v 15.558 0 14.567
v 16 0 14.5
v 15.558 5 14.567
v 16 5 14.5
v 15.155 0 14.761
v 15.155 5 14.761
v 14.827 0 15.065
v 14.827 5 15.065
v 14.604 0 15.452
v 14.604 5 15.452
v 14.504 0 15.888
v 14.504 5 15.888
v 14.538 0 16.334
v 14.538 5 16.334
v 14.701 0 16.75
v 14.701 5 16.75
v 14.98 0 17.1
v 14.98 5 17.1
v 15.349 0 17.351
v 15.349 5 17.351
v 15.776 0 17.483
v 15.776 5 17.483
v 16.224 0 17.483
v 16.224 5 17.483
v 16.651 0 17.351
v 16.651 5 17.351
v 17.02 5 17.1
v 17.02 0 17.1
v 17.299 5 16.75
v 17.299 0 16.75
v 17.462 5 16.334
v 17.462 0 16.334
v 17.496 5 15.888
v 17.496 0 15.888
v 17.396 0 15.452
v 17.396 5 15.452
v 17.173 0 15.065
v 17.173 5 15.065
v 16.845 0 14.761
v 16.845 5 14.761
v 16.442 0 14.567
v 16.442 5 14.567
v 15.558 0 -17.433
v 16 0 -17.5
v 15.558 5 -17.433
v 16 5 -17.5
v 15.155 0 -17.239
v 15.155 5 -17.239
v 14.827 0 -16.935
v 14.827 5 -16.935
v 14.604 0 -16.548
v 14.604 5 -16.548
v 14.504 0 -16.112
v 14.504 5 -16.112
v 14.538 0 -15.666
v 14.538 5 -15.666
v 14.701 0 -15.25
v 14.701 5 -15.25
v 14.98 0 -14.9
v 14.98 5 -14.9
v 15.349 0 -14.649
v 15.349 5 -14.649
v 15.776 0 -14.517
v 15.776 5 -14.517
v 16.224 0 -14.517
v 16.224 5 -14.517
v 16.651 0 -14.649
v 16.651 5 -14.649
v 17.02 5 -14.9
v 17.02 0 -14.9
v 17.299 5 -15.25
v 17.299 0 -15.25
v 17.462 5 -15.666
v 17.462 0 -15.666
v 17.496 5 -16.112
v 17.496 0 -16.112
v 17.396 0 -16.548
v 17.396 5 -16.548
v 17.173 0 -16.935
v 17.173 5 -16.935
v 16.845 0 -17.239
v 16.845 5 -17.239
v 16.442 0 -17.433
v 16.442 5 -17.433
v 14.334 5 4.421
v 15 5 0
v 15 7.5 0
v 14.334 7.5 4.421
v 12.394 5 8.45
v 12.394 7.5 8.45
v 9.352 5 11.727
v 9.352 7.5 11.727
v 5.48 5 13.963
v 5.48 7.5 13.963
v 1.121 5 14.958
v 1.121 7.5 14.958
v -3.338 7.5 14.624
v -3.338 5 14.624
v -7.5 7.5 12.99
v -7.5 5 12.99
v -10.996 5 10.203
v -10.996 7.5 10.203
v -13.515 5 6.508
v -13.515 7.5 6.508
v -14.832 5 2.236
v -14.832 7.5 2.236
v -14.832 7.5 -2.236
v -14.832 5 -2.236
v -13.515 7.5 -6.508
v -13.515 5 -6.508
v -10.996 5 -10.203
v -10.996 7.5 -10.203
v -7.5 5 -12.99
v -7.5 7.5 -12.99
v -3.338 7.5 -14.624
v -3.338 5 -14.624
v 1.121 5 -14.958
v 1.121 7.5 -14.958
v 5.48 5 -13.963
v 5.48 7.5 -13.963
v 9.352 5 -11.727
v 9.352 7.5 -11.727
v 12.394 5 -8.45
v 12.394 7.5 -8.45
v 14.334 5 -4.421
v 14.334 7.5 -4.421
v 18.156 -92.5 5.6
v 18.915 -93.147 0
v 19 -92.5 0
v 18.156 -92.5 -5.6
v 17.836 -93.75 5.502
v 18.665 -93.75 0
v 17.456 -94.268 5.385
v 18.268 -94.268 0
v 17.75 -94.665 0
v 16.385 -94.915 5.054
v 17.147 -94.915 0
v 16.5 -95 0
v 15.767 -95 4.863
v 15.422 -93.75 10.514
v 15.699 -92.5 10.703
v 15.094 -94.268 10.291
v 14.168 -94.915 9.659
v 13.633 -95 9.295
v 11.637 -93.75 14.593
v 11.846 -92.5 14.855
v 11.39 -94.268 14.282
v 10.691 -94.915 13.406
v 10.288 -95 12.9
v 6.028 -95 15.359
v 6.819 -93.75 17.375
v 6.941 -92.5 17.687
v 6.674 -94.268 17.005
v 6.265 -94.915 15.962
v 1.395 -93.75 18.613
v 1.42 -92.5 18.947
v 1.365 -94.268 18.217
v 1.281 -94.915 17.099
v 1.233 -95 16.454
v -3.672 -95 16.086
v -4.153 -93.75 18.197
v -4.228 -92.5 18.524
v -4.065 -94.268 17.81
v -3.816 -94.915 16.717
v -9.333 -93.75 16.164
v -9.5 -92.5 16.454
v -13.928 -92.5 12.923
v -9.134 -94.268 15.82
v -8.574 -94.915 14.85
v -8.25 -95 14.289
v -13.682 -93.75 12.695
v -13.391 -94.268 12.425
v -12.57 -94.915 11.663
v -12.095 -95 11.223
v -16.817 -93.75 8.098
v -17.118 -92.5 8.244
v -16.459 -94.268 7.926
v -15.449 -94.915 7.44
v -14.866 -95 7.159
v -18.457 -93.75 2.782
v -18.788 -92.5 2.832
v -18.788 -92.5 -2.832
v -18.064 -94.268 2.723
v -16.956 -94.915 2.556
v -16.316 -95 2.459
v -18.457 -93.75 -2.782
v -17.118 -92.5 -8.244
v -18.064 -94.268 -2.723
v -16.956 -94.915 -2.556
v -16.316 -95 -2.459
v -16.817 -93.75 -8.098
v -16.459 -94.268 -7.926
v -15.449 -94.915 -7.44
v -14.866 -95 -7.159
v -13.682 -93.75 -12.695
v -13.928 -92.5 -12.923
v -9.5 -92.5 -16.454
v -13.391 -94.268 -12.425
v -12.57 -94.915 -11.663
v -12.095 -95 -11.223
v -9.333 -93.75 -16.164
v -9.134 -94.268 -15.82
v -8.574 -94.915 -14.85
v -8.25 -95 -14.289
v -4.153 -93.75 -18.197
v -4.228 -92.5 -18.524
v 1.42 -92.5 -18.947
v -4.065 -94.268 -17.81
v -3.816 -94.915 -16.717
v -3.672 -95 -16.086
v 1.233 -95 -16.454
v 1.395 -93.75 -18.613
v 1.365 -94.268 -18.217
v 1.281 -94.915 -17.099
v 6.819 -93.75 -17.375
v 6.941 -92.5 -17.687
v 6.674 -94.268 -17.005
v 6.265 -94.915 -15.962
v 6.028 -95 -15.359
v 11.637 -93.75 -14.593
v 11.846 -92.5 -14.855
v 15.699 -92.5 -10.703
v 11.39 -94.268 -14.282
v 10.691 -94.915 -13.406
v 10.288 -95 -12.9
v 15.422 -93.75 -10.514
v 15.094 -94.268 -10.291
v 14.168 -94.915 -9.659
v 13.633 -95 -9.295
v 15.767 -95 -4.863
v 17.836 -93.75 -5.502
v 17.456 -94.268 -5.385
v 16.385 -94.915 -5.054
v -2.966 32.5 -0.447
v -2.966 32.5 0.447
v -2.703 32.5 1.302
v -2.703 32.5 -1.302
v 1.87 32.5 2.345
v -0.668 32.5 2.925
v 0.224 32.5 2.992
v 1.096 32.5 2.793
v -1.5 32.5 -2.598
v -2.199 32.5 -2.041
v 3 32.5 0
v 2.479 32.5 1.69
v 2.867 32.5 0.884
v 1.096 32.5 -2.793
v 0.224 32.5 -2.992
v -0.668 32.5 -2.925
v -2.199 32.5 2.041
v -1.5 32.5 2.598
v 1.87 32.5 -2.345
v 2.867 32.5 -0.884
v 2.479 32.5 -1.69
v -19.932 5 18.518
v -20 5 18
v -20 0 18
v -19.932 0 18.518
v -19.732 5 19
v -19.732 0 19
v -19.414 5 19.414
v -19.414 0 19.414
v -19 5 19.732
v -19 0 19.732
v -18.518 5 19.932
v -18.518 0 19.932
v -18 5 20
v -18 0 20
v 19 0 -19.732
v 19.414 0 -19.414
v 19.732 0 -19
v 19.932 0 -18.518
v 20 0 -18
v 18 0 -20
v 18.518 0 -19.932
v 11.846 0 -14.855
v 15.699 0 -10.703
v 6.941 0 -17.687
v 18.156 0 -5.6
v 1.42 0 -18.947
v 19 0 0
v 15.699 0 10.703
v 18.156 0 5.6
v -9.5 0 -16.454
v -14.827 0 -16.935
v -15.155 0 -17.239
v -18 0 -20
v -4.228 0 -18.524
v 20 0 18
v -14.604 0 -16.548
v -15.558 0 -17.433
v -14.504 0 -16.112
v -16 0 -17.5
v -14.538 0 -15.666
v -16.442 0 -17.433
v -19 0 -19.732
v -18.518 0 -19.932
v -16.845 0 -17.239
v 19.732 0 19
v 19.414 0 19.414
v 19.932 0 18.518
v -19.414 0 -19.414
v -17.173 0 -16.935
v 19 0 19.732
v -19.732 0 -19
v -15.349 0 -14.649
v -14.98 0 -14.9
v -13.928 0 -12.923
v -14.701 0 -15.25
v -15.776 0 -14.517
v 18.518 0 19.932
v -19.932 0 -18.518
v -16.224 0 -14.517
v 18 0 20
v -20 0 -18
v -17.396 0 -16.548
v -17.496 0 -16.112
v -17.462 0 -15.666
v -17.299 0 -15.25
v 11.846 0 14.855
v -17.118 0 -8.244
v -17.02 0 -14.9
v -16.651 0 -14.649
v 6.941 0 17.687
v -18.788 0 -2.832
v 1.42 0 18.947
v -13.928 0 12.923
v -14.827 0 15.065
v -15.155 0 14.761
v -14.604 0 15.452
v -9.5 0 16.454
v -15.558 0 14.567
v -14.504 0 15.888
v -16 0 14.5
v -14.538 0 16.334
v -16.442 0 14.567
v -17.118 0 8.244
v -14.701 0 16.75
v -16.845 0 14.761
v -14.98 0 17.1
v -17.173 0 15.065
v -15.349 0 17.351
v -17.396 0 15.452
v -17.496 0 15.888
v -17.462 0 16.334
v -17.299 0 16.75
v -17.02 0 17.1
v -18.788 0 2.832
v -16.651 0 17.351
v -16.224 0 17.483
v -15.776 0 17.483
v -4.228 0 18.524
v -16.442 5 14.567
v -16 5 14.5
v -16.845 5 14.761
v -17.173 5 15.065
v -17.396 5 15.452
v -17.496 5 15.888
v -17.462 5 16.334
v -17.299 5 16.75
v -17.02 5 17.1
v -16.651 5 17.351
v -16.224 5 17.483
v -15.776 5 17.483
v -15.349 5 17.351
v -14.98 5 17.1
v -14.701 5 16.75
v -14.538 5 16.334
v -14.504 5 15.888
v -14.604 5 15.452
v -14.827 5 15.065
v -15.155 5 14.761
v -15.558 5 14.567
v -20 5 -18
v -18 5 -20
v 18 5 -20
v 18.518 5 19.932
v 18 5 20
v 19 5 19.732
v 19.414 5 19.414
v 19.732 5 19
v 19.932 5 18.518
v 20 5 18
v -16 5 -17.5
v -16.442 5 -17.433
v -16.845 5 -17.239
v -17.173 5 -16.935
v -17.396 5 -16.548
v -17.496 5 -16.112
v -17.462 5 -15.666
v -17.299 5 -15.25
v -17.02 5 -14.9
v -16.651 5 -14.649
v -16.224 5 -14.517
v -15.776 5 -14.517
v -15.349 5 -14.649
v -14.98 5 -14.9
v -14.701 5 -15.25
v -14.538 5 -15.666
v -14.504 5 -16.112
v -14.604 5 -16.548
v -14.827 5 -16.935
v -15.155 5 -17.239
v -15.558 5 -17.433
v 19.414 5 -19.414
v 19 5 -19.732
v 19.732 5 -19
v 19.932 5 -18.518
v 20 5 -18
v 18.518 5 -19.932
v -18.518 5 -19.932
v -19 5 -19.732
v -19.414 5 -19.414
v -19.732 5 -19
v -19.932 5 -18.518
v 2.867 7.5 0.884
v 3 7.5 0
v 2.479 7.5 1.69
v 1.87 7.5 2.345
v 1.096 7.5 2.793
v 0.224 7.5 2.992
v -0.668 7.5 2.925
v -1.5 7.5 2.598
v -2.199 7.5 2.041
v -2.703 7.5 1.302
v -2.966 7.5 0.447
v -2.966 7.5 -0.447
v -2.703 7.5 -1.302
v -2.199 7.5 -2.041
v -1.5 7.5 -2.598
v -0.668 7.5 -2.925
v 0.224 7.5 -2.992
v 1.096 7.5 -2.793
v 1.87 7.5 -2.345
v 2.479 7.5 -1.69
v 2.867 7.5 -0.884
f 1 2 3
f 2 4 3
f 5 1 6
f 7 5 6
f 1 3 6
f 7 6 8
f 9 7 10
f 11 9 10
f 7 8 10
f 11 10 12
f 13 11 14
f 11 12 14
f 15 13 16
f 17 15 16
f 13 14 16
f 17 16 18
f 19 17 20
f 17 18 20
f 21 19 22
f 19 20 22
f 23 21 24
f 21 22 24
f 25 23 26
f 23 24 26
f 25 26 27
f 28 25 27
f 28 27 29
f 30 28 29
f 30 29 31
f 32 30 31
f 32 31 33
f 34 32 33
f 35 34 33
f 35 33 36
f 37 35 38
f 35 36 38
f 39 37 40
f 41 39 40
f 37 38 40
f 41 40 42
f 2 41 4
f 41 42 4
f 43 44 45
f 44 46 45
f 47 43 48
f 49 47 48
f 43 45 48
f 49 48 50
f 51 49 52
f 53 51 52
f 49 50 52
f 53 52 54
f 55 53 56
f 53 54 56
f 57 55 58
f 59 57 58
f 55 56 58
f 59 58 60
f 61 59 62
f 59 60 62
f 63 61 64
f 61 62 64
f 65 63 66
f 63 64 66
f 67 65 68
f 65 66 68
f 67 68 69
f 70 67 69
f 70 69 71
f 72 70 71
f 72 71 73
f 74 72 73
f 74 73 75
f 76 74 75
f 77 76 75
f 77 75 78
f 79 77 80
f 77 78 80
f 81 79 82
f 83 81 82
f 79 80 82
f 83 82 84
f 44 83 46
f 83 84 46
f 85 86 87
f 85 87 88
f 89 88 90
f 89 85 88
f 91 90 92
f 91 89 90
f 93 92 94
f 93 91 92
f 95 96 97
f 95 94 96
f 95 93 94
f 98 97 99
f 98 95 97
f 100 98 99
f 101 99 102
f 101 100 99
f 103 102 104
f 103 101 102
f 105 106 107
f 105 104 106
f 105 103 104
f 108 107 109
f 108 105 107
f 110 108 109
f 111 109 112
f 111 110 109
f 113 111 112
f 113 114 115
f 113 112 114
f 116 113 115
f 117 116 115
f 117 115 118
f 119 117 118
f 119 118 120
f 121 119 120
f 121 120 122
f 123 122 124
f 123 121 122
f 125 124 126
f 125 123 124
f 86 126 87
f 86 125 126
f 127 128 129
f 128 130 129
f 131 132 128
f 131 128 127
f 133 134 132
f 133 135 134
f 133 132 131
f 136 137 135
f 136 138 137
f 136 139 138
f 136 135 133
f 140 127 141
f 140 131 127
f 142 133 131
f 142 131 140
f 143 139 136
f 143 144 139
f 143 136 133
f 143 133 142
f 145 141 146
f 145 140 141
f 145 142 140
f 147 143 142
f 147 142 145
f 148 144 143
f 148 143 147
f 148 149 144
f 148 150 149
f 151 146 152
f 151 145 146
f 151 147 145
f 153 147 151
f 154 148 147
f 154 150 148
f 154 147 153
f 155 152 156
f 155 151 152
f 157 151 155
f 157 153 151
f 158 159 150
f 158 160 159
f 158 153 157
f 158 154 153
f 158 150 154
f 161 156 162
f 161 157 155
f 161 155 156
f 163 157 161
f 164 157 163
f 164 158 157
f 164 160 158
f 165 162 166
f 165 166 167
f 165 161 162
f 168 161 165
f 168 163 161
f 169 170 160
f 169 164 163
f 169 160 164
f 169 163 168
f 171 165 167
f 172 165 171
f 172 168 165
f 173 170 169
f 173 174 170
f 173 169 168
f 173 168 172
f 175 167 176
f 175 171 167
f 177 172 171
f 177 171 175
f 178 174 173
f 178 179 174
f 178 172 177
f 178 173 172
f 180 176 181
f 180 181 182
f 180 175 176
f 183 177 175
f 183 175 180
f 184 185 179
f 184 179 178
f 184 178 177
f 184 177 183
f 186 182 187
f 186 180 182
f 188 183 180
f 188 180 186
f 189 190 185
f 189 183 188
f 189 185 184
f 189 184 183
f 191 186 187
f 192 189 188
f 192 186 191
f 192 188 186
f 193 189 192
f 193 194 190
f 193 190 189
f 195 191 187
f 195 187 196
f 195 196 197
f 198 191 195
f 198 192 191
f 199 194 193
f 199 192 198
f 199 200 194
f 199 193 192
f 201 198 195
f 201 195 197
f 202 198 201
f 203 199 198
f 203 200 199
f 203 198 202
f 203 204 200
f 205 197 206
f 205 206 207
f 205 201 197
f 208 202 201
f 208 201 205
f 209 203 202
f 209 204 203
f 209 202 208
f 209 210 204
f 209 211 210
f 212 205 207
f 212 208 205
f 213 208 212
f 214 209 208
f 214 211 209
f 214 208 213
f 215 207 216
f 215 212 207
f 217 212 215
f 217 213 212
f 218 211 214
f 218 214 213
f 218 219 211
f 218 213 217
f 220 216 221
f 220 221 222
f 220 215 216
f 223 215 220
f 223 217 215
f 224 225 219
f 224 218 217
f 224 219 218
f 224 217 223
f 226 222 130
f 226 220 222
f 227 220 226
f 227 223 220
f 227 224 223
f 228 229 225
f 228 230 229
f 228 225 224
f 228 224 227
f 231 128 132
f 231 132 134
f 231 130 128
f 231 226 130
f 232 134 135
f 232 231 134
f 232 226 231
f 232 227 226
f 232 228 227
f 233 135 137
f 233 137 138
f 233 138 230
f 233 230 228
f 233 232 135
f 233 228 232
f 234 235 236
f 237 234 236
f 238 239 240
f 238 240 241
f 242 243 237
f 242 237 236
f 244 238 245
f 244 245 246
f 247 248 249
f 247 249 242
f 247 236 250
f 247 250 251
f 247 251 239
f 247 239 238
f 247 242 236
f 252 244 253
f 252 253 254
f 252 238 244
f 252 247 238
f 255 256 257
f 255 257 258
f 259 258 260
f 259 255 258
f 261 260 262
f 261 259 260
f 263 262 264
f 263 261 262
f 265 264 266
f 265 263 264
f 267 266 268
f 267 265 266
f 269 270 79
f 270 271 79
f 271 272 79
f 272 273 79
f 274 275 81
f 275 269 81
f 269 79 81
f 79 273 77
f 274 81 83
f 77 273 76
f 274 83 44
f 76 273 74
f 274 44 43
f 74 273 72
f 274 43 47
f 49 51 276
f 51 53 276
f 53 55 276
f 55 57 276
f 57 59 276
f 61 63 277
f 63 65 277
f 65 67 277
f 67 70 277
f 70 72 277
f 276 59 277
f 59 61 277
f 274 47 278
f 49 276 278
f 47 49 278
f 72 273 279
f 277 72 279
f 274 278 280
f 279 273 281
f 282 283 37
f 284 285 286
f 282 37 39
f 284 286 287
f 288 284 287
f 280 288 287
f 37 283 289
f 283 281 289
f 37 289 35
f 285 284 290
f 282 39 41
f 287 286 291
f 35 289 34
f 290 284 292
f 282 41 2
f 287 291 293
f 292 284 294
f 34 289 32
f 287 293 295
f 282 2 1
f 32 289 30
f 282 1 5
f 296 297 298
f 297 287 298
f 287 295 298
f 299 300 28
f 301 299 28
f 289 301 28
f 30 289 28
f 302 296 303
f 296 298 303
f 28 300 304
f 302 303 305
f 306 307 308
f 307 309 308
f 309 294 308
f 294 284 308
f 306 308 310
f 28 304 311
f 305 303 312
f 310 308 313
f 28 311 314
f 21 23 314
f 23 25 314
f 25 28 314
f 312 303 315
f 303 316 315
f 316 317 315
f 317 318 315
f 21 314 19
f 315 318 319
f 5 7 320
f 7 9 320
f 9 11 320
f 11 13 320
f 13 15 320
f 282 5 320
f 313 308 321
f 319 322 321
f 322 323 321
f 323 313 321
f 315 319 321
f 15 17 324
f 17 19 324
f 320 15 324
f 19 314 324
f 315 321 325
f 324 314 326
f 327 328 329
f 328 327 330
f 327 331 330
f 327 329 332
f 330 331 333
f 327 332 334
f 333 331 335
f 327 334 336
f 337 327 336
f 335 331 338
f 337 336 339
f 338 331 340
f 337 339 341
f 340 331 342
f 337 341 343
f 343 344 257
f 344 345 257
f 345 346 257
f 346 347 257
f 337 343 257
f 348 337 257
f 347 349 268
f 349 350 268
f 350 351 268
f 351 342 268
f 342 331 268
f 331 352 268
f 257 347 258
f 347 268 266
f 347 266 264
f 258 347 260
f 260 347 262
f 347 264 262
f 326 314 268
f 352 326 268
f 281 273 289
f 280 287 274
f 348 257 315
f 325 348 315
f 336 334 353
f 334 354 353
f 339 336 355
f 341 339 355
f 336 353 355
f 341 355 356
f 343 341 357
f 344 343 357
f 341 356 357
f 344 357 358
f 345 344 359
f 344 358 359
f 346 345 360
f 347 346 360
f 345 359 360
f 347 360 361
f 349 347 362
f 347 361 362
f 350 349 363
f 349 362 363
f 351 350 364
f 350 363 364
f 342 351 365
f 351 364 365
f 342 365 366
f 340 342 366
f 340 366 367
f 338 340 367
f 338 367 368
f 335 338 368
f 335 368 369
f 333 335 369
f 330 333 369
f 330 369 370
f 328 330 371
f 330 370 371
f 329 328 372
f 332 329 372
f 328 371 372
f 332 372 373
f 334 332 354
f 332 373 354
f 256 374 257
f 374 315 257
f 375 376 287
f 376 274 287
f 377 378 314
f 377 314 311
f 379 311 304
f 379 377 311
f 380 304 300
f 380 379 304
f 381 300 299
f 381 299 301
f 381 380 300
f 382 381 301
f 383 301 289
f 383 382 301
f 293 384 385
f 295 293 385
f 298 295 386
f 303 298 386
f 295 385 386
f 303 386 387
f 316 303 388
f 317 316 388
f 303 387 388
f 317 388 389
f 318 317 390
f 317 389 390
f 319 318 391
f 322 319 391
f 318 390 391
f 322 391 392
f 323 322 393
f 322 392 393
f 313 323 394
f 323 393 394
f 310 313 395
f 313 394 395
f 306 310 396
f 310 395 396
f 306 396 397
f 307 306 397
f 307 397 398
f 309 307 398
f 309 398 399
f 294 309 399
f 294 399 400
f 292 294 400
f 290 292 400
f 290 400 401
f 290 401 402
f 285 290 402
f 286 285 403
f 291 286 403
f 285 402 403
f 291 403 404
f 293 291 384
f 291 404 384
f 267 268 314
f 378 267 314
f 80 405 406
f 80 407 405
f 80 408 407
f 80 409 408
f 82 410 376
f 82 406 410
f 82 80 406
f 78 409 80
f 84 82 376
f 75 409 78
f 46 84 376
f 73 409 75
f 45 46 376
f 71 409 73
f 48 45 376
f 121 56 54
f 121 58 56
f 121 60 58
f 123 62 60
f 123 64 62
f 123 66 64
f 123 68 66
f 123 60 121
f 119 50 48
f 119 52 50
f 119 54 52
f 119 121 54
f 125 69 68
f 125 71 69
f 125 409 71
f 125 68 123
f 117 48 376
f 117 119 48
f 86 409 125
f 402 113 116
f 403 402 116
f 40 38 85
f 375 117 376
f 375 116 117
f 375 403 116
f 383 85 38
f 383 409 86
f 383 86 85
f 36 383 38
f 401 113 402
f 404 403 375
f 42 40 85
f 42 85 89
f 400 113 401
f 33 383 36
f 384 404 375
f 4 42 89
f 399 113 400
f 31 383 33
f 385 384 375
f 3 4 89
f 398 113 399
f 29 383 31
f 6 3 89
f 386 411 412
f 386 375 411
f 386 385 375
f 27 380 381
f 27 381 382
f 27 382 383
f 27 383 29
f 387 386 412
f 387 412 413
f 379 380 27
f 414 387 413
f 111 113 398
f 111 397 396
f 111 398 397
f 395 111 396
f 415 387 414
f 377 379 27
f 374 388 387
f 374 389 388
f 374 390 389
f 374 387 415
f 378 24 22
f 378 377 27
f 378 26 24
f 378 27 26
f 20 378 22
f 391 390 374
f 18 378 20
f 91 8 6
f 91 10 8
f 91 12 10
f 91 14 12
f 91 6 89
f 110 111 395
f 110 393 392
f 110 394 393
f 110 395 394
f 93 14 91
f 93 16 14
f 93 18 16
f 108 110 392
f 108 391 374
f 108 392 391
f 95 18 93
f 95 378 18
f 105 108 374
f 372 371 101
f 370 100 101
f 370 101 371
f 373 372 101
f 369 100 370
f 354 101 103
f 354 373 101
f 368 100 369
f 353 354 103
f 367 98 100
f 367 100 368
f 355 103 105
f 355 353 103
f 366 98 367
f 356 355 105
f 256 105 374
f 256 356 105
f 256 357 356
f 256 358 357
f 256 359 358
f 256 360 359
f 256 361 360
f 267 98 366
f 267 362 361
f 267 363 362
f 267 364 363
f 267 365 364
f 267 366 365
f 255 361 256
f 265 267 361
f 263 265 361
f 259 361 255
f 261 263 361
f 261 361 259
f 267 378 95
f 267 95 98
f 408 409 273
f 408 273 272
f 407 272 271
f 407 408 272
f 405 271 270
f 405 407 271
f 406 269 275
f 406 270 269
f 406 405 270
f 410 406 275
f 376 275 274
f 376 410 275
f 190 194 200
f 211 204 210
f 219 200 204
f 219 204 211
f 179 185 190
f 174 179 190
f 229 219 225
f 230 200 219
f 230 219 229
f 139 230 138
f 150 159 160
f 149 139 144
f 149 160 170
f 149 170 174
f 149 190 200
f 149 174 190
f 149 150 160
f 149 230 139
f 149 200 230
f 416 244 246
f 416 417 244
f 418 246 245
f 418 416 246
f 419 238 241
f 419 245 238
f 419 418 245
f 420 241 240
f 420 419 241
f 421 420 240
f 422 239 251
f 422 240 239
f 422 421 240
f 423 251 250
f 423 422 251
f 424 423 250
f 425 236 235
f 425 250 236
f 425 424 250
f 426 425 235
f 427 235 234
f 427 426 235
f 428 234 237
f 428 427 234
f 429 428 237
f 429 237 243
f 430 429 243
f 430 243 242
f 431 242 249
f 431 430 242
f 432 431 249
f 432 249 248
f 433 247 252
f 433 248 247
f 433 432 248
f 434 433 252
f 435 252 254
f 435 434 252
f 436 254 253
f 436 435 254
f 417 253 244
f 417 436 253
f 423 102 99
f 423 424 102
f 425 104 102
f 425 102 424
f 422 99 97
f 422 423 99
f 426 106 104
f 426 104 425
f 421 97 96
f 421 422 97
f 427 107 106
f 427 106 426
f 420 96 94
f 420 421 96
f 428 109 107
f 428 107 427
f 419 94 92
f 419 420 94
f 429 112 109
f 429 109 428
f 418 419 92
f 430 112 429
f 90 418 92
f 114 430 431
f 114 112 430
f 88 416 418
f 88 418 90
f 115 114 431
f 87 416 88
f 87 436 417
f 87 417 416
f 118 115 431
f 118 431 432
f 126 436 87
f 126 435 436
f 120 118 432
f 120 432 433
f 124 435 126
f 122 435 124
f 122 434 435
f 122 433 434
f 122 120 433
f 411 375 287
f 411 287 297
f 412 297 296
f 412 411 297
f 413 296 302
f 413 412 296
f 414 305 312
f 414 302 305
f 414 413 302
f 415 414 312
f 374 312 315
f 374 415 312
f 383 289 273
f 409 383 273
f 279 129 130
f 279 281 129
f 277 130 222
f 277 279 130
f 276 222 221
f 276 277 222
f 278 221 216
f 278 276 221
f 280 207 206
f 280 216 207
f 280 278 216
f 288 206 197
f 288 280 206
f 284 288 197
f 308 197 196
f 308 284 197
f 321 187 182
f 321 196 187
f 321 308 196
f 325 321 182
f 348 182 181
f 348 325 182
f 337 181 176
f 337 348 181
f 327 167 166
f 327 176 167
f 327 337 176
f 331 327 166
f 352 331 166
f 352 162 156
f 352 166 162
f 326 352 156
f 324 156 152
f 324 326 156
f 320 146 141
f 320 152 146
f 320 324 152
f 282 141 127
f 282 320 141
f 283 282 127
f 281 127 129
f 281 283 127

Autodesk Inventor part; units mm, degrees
ref_plane "YZ Plane" through (0, 0, 0) normal (1, 0, 0) x (0, 1, 0)
ref_plane "XZ Plane" through (0, 0, 0) normal (0, 1, 0) x (-1, 0, 0)
ref_plane "XY Plane" through (0, 0, 0) normal (0, 0, 1) x (1, 0, 0)
sketch "Sketch1" plane through (0, 0, 0) normal (0, 1, 0) x (-1, 0, 0)
  line L0 (20, 20) -> (-20, 20)
  line L1 (-20, 20) -> (-20, -20)
  line L2 (-20, -20) -> (20, -20)
  line L3 (20, -20) -> (20, 20)
  line L4 (20, 20) -> (-20, -20) construction
  line L5 (-20, 20) -> (20, -20) construction
  line L6 (16, 16) -> (-16, 16)
  line L7 (-16, 16) -> (-16, -16)
  line L8 (-16, -16) -> (16, -16)
  line L9 (16, -16) -> (16, 16)
  line L10 (16, 16) -> (-16, -16) construction
  line L11 (-16, 16) -> (16, -16) construction
  point P0 (0, 0)
  dimension "d0" = 40
  dimension "d1" = 40
  dimension "d2" = 32
  dimension "d3" = 32
extrude "Extrusion1" add sketch "Sketch1" along normal blind 5 contours L3 L2 L1 L0 | L9 L8 L7 L6
sketch "Sketch2" plane through (0, 5, 0) normal (0, 1, 0) x (1, 0, 0)
  circle A0 centre (0, 0) radius 15
  dimension "d7" = 30
extrude "Extrusion2" add sketch "Sketch2" along normal blind 2.5
sketch "Sketch3" plane through (0, 0, 0) normal (0, -1, 0) x (1, 0, 0)
  circle A0 centre (0, 0) radius 19
  dimension "d10" = 38
extrude "Extrusion3" add sketch "Sketch3" along normal blind 95
fillet "Fillet1" radius 2.5 1 edges at (-19, -95, 0)
fillet "Fillet2" radius 2 4 edges at (20, 2.5, -20) (-20, 2.5, -20) (-20, 2.5, 20) (20, 2.5, 20)
hole "Hole1" at (16, 0, -16) at (16, 0, 16) at (-16, 0, -16) at (-16, 0, 16) direction (0, 1, 0) diameter 3 depth 5 tip angle 118
sketch "Sketch4" plane through (0, 7.5, 0) normal (0, 1, 0) x (1, 0, 0)
  circle A0 centre (0, 0) radius 3
  dimension "d22" = 6
extrude "Extrusion4" add sketch "Sketch4" along normal blind 25
equation "\"d1\" = d0"
equation "\"d3\" = d2"
properties part number "Nanotec-DH052-120E-Servo"
